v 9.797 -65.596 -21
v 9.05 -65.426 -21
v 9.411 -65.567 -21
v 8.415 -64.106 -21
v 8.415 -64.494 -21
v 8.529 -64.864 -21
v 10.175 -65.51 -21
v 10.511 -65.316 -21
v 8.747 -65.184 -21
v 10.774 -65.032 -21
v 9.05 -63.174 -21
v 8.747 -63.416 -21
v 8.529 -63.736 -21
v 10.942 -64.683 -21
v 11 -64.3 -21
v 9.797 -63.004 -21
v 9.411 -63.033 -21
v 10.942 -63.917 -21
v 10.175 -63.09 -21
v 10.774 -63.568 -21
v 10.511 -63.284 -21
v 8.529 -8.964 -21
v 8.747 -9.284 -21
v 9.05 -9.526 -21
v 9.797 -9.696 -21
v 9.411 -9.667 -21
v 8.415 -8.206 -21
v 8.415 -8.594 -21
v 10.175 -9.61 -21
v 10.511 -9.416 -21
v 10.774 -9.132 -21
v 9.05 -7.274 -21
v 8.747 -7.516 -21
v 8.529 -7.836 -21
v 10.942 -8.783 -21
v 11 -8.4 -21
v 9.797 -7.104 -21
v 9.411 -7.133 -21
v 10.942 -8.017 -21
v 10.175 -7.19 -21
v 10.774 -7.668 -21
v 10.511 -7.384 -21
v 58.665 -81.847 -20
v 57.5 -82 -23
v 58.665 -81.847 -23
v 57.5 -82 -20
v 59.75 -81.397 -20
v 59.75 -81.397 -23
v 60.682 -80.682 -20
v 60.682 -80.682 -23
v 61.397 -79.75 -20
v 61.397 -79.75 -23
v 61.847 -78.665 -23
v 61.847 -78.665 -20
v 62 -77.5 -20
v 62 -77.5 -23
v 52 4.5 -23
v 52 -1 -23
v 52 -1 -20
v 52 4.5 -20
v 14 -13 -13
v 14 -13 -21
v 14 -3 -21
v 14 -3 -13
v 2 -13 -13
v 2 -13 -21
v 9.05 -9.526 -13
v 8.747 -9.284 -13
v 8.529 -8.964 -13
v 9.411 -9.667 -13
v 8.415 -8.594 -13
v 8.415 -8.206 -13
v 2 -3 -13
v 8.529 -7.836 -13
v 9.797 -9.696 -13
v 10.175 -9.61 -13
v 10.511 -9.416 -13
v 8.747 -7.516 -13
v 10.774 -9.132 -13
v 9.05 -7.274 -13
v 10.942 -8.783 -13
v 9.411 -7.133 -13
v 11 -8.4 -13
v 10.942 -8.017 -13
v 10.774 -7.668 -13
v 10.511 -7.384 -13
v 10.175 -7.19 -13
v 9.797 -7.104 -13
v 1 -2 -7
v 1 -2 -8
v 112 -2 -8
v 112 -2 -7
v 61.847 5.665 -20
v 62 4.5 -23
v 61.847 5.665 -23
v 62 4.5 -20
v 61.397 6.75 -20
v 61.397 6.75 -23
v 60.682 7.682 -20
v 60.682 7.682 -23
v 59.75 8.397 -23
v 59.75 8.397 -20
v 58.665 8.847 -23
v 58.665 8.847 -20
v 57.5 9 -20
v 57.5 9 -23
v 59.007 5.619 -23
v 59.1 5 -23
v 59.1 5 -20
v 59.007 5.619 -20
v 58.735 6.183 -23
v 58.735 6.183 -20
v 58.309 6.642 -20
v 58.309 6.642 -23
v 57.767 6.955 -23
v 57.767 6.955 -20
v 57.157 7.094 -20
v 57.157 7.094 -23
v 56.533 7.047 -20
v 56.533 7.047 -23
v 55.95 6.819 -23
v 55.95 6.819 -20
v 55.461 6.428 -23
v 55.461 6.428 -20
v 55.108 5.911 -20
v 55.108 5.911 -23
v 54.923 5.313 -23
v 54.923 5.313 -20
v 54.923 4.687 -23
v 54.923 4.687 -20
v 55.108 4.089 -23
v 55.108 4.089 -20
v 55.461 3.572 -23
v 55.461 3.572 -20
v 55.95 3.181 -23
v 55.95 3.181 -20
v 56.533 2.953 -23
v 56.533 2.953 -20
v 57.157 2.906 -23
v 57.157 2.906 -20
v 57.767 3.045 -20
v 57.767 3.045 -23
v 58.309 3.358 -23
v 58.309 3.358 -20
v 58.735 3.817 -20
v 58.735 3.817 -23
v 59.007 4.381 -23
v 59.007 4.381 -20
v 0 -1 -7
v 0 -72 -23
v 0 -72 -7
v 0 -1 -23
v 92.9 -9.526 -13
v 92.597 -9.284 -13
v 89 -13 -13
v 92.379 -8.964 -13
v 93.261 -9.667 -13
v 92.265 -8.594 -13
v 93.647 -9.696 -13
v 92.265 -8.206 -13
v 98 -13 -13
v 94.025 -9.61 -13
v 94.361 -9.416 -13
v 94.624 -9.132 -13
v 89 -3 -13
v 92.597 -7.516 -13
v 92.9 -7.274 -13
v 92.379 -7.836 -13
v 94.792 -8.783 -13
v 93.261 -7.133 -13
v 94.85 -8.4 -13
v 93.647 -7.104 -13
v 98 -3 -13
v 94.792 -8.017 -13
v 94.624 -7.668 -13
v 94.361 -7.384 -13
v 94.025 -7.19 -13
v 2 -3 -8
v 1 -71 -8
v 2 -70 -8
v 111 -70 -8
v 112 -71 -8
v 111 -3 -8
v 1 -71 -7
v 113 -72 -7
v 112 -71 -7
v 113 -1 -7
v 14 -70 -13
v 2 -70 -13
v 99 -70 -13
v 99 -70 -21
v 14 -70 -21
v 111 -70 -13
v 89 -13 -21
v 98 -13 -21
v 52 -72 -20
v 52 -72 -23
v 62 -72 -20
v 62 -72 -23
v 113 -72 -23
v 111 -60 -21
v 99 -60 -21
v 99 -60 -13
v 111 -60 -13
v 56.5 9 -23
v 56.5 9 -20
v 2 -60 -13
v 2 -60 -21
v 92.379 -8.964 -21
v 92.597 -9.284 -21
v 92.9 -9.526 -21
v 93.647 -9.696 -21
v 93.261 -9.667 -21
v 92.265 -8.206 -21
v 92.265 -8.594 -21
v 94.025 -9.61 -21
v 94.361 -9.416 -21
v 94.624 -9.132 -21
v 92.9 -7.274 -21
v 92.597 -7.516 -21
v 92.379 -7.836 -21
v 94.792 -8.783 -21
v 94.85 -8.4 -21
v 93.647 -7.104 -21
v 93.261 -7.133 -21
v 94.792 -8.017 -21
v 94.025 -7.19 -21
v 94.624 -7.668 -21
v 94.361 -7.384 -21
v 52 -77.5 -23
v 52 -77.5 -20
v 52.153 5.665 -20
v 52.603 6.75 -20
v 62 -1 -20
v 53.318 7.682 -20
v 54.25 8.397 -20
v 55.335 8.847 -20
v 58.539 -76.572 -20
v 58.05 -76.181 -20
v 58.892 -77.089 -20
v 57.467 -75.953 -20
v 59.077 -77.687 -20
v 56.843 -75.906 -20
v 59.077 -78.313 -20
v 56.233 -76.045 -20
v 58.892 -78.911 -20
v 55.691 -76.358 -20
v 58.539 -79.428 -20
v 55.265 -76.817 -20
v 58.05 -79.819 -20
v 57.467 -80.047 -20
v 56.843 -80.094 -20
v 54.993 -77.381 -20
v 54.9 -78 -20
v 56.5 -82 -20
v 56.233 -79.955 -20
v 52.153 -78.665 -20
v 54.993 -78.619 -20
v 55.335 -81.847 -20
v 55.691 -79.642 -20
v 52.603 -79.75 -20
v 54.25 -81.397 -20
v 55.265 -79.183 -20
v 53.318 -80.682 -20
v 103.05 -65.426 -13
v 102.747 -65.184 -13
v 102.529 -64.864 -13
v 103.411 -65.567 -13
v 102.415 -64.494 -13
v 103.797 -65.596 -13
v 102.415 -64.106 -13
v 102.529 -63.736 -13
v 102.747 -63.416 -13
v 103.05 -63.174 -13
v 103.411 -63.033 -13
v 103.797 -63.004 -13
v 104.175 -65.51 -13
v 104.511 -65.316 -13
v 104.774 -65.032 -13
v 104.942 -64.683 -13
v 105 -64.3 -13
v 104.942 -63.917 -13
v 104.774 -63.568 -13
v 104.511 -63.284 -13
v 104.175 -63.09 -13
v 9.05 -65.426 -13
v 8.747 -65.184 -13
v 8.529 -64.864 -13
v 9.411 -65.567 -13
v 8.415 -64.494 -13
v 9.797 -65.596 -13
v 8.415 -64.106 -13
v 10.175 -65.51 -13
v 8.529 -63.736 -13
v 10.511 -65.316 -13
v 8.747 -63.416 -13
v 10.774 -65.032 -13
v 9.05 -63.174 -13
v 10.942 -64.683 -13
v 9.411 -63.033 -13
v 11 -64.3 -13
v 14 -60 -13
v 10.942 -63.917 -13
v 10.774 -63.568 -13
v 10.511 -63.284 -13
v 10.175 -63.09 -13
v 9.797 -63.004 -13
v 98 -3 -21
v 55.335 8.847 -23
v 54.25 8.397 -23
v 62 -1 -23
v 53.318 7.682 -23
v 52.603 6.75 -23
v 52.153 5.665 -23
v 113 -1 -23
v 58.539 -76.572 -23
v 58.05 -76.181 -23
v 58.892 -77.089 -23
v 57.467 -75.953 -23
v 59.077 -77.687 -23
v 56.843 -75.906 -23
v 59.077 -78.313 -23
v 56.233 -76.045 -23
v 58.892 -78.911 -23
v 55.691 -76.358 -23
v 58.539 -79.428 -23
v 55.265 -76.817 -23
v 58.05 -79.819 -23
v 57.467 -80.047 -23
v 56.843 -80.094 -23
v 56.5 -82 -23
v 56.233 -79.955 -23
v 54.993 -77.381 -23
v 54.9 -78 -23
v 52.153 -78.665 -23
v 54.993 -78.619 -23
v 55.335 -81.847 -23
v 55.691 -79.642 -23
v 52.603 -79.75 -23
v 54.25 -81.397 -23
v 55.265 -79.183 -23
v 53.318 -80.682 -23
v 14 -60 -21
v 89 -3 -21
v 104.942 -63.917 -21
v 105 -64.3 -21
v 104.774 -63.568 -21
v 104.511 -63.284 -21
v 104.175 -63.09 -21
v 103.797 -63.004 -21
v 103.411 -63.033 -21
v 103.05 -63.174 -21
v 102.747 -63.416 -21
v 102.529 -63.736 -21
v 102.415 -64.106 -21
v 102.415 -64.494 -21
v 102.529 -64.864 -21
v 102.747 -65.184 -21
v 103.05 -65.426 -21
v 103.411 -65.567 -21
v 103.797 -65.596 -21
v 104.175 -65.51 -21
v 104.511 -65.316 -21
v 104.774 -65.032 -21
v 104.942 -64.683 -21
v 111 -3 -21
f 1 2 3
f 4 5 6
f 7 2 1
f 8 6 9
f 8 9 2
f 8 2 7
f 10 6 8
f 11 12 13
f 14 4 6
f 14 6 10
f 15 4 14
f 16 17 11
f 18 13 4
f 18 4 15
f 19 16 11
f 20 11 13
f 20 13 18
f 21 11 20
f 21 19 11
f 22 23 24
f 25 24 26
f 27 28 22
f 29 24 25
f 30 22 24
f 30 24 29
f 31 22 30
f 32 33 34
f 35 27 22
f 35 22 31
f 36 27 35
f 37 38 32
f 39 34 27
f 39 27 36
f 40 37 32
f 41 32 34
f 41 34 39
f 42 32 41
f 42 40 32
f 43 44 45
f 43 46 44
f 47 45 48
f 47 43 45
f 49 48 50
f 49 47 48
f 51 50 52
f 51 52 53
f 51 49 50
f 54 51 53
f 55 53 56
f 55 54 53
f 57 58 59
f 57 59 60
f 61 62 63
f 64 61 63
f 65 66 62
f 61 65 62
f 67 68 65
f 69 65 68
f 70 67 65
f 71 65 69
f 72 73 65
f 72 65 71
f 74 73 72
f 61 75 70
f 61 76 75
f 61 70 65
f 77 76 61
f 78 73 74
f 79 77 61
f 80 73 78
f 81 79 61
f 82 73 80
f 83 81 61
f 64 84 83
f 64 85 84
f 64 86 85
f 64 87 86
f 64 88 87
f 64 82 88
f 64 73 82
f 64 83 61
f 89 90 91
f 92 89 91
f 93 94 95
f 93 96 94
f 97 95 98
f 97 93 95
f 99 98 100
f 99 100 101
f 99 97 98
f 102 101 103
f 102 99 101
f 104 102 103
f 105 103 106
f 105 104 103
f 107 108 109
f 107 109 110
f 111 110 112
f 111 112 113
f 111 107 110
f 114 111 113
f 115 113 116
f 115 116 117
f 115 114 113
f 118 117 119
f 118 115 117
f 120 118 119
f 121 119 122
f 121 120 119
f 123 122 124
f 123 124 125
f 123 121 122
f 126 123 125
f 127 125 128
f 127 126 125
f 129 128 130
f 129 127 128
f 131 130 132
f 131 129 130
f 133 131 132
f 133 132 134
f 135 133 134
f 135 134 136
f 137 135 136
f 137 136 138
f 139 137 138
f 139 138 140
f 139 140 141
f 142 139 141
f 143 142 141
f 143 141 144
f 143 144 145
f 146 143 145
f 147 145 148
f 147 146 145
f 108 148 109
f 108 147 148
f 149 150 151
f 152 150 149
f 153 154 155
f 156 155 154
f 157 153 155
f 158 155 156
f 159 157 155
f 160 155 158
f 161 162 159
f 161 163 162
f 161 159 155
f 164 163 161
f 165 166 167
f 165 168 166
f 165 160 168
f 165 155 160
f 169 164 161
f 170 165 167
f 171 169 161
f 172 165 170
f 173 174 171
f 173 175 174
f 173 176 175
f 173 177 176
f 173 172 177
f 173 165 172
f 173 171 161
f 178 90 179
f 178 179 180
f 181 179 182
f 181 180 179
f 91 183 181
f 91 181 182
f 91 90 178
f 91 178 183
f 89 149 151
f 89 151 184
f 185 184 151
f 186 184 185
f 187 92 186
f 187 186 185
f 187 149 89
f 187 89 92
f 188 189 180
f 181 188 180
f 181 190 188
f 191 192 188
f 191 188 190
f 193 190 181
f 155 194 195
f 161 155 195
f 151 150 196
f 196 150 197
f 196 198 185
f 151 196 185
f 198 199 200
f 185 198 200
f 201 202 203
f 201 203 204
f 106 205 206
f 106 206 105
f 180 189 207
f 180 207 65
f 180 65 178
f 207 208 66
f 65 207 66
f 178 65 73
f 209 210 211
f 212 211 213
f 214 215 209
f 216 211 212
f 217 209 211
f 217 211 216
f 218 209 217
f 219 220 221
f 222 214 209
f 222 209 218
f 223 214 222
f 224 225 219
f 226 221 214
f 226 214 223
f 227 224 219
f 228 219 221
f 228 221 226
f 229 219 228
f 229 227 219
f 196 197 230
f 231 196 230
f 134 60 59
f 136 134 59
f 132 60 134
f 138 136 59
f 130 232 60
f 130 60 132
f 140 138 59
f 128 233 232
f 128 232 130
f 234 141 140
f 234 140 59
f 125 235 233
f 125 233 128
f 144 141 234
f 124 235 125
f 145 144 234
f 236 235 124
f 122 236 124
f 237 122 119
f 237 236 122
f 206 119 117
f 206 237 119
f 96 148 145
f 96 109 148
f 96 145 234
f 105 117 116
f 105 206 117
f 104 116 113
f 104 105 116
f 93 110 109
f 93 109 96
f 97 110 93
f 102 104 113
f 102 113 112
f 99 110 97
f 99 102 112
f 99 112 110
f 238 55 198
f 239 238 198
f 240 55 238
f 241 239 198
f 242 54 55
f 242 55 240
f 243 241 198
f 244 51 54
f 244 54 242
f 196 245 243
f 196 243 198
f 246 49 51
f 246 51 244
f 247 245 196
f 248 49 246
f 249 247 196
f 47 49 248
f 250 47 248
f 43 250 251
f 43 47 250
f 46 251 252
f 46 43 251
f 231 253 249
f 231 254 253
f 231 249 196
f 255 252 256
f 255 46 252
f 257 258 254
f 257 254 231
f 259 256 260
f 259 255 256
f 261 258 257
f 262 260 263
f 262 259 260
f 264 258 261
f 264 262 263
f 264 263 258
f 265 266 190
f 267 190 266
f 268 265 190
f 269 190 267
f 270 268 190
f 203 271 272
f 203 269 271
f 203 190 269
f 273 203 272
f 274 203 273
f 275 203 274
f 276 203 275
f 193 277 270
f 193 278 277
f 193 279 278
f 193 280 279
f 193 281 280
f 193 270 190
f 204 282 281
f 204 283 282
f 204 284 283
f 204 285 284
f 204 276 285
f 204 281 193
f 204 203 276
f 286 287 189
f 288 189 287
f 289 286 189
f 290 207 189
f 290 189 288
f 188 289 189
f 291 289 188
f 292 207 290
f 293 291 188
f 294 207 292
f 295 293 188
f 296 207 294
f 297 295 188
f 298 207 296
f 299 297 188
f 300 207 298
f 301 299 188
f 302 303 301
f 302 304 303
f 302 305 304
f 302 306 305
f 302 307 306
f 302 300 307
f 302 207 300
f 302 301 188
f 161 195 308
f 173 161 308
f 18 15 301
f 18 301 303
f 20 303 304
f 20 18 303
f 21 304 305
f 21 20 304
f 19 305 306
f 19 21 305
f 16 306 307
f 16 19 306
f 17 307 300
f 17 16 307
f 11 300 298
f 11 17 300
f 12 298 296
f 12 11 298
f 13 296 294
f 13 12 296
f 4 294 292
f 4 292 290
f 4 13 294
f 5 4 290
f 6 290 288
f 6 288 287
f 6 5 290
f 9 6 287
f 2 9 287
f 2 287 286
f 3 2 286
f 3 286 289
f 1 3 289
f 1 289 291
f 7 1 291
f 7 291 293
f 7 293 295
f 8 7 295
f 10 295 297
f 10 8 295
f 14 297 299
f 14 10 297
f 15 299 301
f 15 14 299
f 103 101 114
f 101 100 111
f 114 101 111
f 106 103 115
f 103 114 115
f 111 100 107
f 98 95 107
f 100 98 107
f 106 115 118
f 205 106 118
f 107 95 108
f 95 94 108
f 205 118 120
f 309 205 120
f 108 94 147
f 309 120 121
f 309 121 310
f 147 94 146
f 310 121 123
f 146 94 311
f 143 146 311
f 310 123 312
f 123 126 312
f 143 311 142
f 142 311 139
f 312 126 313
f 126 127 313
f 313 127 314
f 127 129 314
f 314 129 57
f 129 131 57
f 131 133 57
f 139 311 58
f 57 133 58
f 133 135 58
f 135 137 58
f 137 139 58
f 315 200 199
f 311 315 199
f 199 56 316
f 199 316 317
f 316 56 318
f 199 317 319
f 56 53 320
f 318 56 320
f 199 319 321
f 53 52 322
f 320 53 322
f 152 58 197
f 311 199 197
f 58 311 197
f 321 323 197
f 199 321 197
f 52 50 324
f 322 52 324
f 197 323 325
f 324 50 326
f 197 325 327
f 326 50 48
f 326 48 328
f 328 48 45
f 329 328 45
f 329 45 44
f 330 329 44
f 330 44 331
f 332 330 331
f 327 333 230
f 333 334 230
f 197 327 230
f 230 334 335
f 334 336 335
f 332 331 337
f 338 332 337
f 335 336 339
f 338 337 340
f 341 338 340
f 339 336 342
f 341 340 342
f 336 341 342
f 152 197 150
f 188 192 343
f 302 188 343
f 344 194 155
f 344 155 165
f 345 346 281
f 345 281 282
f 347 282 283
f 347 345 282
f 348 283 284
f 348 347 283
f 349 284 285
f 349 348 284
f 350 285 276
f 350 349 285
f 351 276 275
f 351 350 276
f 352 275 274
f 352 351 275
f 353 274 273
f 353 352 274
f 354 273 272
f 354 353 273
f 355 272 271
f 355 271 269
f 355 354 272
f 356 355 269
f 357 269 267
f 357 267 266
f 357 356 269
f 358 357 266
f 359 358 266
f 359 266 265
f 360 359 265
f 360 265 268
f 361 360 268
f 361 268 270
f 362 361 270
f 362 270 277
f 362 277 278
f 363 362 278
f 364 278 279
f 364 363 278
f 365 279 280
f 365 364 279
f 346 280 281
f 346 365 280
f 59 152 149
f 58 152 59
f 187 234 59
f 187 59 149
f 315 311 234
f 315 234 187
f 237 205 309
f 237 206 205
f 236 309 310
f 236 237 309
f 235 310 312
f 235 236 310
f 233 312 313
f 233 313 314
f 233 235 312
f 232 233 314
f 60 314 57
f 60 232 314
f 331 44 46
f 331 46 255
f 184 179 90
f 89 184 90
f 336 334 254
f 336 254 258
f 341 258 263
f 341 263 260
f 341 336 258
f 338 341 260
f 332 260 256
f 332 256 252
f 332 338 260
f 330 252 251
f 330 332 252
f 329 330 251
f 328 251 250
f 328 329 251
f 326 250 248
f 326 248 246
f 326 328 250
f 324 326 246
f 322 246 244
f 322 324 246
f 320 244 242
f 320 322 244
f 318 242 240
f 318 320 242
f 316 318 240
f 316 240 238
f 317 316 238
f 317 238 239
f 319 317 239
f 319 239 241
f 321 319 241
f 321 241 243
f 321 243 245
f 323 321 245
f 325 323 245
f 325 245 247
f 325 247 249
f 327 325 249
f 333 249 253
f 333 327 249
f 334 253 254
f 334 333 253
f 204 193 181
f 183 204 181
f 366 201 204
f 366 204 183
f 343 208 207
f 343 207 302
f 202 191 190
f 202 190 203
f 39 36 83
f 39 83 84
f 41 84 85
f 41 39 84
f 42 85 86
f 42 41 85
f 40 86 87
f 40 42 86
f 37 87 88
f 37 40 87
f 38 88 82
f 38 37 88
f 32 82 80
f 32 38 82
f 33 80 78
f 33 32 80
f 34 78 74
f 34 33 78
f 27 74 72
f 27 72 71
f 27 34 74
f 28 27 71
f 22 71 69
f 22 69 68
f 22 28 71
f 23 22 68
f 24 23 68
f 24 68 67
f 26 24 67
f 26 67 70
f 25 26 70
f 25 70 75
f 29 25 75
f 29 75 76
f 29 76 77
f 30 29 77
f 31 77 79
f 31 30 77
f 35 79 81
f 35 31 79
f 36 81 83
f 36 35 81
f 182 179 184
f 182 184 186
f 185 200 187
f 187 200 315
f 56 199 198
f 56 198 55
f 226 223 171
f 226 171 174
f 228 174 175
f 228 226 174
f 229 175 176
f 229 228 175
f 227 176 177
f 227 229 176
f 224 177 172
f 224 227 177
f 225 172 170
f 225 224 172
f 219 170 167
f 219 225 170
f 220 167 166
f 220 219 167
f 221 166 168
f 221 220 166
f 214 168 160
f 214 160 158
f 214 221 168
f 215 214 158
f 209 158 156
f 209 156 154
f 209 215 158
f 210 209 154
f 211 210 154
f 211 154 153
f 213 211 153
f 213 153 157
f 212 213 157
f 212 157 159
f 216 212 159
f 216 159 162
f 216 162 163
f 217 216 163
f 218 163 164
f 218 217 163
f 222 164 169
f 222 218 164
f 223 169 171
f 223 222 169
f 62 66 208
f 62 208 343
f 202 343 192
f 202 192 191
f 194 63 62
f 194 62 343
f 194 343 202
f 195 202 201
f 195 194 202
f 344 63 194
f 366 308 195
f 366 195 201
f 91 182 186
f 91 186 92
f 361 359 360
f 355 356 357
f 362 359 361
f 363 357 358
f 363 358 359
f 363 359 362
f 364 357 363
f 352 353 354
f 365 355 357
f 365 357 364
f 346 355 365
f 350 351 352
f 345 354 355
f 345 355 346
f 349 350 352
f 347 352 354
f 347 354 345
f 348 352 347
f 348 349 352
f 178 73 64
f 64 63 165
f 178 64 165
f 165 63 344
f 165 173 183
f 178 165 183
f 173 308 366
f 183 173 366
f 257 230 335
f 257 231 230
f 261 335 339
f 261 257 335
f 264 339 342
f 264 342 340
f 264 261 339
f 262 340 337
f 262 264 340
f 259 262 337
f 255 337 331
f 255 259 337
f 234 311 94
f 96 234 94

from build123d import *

# Parameters (mm, degrees)
CYLINDER009_R          = 2.1
CYLINDER009_DEPTH      = 3
BOX018_W               = 10
BOX018_H               = 12
BOX018_DEPTH           = 3
FILLET002_R            = 4.5
FILLET003_R            = 4.5
CUT018_PLACEMENT_ANGLE = 180
CYLINDER008_R          = 2.1
CYLINDER008_DEPTH      = 3
BOX017_W               = 10
BOX017_H               = 12
BOX017_DEPTH           = 3
FILLET_R               = 4.5
FILLET001_R            = 4.5
CYLINDER002_R          = 1.3
CYLINDER002_DEPTH      = 8
BOX016_W               = 9
BOX016_H               = 10
BOX016_DEPTH           = 8
CYLINDER003_R          = 1.3
CYLINDER003_DEPTH      = 8
BOX015_W               = 12
BOX015_H               = 10
BOX015_DEPTH           = 8
CYLINDER001_R          = 1.3
CYLINDER001_DEPTH      = 8
BOX013_W               = 12
BOX013_H               = 10
BOX013_DEPTH           = 8
CYLINDER_R             = 1.3
CYLINDER_DEPTH         = 8
BOX014_W               = 12
BOX014_H               = 10
BOX014_DEPTH           = 8
BOX003_W               = 111
BOX003_H               = 69
BOX003_DEPTH           = 1
BOX002_W               = 113
BOX002_H               = 71
BOX002_DEPTH           = 1
BOX001_W               = 109
BOX001_H               = 67
BOX001_DEPTH           = 13
BOX_W                  = 113
BOX_H                  = 71
BOX_DEPTH              = 15


with BuildPart() as zylinder001:
    # Cylinder009 → Cylinder009 (new body)
    with BuildSketch(Plane(origin=(5, 5, -23), x_dir=(1, 0, 0), z_dir=(0, 0, 1))):
        Circle(CYLINDER009_R)
    extrude(amount=CYLINDER009_DEPTH)


with BuildPart() as ear_u:
    # Box018 → Box018 (new body)
    with BuildSketch(Plane(origin=(0, -3, -23), x_dir=(1, 0, 0), z_dir=(0, 0, 1))):
        with Locations((5, 6)):
            Rectangle(BOX018_W, BOX018_H)
    extrude(amount=BOX018_DEPTH)

    # Fillet002
    fillet002_edges = [ear_u.edges().sort_by_distance(p)[0] for p in [
        (10, 9, -21.5),
    ]]
    fillet(fillet002_edges, radius=FILLET002_R)

    # Fillet003
    fillet003_edges = [ear_u.edges().sort_by_distance(p)[0] for p in [
        (0, 9, -21.5),
    ]]
    fillet(fillet003_edges, radius=FILLET003_R)

    # Cut018: cut Zylinder001
    add(zylinder001.part, mode=Mode.SUBTRACT)


with BuildPart() as ear_u_1:
    # Cut018 placement: moved
    add(ear_u.part.moved(Location((62, -73, 0))).rotate(Axis((62, -73, 0), (0, 0, 1)), CUT018_PLACEMENT_ANGLE))


with BuildPart() as zylinder:
    # Cylinder008 → Cylinder008 (new body)
    with BuildSketch(Plane(origin=(5, 5, -23), x_dir=(1, 0, 0), z_dir=(0, 0, 1))):
        Circle(CYLINDER008_R)
    extrude(amount=CYLINDER008_DEPTH)


with BuildPart() as ear_o:
    # Box017 → Box017 (new body)
    with BuildSketch(Plane(origin=(0, -3, -23), x_dir=(1, 0, 0), z_dir=(0, 0, 1))):
        with Locations((5, 6)):
            Rectangle(BOX017_W, BOX017_H)
    extrude(amount=BOX017_DEPTH)

    # Fillet
    fillet_edges = [ear_o.edges().sort_by_distance(p)[0] for p in [
        (10, 9, -21.5),
    ]]
    fillet(fillet_edges, radius=FILLET_R)

    # Fillet001
    fillet001_edges = [ear_o.edges().sort_by_distance(p)[0] for p in [
        (0, 9, -21.5),
    ]]
    fillet(fillet001_edges, radius=FILLET001_R)

    # Cut017: cut Zylinder
    add(zylinder.part, mode=Mode.SUBTRACT)


with BuildPart() as ear_o_1:
    # Cut017 placement: moved
    add(ear_o.part.moved(Location((52, 0, 0))))


with BuildPart() as fasteninghole_ro:
    # Cylinder002 → Cylinder002 (new body)
    with BuildSketch(Plane(origin=(93.55, -8.4, -10), x_dir=(1, 0, 0), z_dir=(0, 0, 1))):
        Circle(CYLINDER002_R)
    extrude(amount=CYLINDER002_DEPTH)


with BuildPart() as fasteningblock_ro:
    # Box016 → Box016 (new body)
    with BuildSketch(Plane(origin=(89, -13, -10), x_dir=(1, 0, 0), z_dir=(0, 0, 1))):
        with Locations((4.5, 5)):
            Rectangle(BOX016_W, BOX016_H)
    extrude(amount=BOX016_DEPTH)

    # Cut011: cut FasteningHole_RO
    add(fasteninghole_ro.part, mode=Mode.SUBTRACT)


with BuildPart() as fasteninghole_ru:
    # Cylinder003 → Cylinder003 (new body)
    with BuildSketch(Plane(origin=(103.7, -64.3, -10), x_dir=(1, 0, 0), z_dir=(0, 0, 1))):
        Circle(CYLINDER003_R)
    extrude(amount=CYLINDER003_DEPTH)


with BuildPart() as fasteningblock_ru:
    # Box015 → Box015 (new body)
    with BuildSketch(Plane(origin=(99, -70, -10), x_dir=(1, 0, 0), z_dir=(0, 0, 1))):
        with Locations((6, 5)):
            Rectangle(BOX015_W, BOX015_H)
    extrude(amount=BOX015_DEPTH)

    # Cut012: cut FasteningHole_RU
    add(fasteninghole_ru.part, mode=Mode.SUBTRACT)


with BuildPart() as fasteninghole_lu:
    # Cylinder001 → Cylinder001 (new body)
    with BuildSketch(Plane(origin=(9.7, -64.3, -10), x_dir=(1, 0, 0), z_dir=(0, 0, 1))):
        Circle(CYLINDER001_R)
    extrude(amount=CYLINDER001_DEPTH)


with BuildPart() as fasteningblock_lu:
    # Box013 → Box013 (new body)
    with BuildSketch(Plane(origin=(2, -70, -10), x_dir=(1, 0, 0), z_dir=(0, 0, 1))):
        with Locations((6, 5)):
            Rectangle(BOX013_W, BOX013_H)
    extrude(amount=BOX013_DEPTH)

    # Cut010: cut FasteningHole_LU
    add(fasteninghole_lu.part, mode=Mode.SUBTRACT)


with BuildPart() as fasteninghole_lo:
    # Cylinder → Cylinder (new body)
    with BuildSketch(Plane(origin=(9.7, -8.4, -10), x_dir=(1, 0, 0), z_dir=(0, 0, 1))):
        Circle(CYLINDER_R)
    extrude(amount=CYLINDER_DEPTH)


with BuildPart() as fasteningblock_lo:
    # Box014 → Box014 (new body)
    with BuildSketch(Plane(origin=(2, -13, -10), x_dir=(1, 0, 0), z_dir=(0, 0, 1))):
        with Locations((6, 5)):
            Rectangle(BOX014_W, BOX014_H)
    extrude(amount=BOX014_DEPTH)

    # Cut009: cut FasteningHole_LO
    add(fasteninghole_lo.part, mode=Mode.SUBTRACT)


with BuildPart() as casebottomlip_in:
    # Box003 → Box003 (new body)
    with BuildSketch(Plane(origin=(1, -71, 3), x_dir=(1, 0, 0), z_dir=(0, 0, 1))):
        with Locations((55.5, 34.5)):
            Rectangle(BOX003_W, BOX003_H)
    extrude(amount=BOX003_DEPTH)


with BuildPart() as casebottomlip:
    # Box002 → Box002 (new body)
    with BuildSketch(Plane(origin=(0, -72, 3), x_dir=(1, 0, 0), z_dir=(0, 0, 1))):
        with Locations((56.5, 35.5)):
            Rectangle(BOX002_W, BOX002_H)
    extrude(amount=BOX002_DEPTH)

    # Cut001: cut CaseBottomLip_In
    add(casebottomlip_in.part, mode=Mode.SUBTRACT)


with BuildPart() as casebottombed_in:
    # Box001 → Box001 (new body)
    with BuildSketch(Plane(origin=(2, -70, -10), x_dir=(1, 0, 0), z_dir=(0, 0, 1))):
        with Locations((54.5, 33.5)):
            Rectangle(BOX001_W, BOX001_H)
    extrude(amount=BOX001_DEPTH)


with BuildPart() as casebottom:
    # Box → Box (new body)
    with BuildSketch(Plane(origin=(0, -72, -12), x_dir=(1, 0, 0), z_dir=(0, 0, 1))):
        with Locations((56.5, 35.5)):
            Rectangle(BOX_W, BOX_H)
    extrude(amount=BOX_DEPTH)

    # Cut: cut CaseBottomBed_In
    add(casebottombed_in.part, mode=Mode.SUBTRACT)

    # Fusion: union CaseBottomLip
    add(casebottomlip.part)

    # Fusion002: union FasteningBlock_LO
    add(fasteningblock_lo.part)

    # Fusion003: union FasteningBlock_LU
    add(fasteningblock_lu.part)

    # Fusion004: union FasteningBlock_RU
    add(fasteningblock_ru.part)

    # Fusion005: union FasteningBlock_RO
    add(fasteningblock_ro.part)


with BuildPart() as casebottom_1:
    # Fusion005 placement: moved
    add(casebottom.part.moved(Location((0, 0, -11))))

    # Fusion010: union Ear_O
    add(ear_o_1.part)

    # Fusion011: union Ear_U
    add(ear_u_1.part)


solid = casebottom_1.part
